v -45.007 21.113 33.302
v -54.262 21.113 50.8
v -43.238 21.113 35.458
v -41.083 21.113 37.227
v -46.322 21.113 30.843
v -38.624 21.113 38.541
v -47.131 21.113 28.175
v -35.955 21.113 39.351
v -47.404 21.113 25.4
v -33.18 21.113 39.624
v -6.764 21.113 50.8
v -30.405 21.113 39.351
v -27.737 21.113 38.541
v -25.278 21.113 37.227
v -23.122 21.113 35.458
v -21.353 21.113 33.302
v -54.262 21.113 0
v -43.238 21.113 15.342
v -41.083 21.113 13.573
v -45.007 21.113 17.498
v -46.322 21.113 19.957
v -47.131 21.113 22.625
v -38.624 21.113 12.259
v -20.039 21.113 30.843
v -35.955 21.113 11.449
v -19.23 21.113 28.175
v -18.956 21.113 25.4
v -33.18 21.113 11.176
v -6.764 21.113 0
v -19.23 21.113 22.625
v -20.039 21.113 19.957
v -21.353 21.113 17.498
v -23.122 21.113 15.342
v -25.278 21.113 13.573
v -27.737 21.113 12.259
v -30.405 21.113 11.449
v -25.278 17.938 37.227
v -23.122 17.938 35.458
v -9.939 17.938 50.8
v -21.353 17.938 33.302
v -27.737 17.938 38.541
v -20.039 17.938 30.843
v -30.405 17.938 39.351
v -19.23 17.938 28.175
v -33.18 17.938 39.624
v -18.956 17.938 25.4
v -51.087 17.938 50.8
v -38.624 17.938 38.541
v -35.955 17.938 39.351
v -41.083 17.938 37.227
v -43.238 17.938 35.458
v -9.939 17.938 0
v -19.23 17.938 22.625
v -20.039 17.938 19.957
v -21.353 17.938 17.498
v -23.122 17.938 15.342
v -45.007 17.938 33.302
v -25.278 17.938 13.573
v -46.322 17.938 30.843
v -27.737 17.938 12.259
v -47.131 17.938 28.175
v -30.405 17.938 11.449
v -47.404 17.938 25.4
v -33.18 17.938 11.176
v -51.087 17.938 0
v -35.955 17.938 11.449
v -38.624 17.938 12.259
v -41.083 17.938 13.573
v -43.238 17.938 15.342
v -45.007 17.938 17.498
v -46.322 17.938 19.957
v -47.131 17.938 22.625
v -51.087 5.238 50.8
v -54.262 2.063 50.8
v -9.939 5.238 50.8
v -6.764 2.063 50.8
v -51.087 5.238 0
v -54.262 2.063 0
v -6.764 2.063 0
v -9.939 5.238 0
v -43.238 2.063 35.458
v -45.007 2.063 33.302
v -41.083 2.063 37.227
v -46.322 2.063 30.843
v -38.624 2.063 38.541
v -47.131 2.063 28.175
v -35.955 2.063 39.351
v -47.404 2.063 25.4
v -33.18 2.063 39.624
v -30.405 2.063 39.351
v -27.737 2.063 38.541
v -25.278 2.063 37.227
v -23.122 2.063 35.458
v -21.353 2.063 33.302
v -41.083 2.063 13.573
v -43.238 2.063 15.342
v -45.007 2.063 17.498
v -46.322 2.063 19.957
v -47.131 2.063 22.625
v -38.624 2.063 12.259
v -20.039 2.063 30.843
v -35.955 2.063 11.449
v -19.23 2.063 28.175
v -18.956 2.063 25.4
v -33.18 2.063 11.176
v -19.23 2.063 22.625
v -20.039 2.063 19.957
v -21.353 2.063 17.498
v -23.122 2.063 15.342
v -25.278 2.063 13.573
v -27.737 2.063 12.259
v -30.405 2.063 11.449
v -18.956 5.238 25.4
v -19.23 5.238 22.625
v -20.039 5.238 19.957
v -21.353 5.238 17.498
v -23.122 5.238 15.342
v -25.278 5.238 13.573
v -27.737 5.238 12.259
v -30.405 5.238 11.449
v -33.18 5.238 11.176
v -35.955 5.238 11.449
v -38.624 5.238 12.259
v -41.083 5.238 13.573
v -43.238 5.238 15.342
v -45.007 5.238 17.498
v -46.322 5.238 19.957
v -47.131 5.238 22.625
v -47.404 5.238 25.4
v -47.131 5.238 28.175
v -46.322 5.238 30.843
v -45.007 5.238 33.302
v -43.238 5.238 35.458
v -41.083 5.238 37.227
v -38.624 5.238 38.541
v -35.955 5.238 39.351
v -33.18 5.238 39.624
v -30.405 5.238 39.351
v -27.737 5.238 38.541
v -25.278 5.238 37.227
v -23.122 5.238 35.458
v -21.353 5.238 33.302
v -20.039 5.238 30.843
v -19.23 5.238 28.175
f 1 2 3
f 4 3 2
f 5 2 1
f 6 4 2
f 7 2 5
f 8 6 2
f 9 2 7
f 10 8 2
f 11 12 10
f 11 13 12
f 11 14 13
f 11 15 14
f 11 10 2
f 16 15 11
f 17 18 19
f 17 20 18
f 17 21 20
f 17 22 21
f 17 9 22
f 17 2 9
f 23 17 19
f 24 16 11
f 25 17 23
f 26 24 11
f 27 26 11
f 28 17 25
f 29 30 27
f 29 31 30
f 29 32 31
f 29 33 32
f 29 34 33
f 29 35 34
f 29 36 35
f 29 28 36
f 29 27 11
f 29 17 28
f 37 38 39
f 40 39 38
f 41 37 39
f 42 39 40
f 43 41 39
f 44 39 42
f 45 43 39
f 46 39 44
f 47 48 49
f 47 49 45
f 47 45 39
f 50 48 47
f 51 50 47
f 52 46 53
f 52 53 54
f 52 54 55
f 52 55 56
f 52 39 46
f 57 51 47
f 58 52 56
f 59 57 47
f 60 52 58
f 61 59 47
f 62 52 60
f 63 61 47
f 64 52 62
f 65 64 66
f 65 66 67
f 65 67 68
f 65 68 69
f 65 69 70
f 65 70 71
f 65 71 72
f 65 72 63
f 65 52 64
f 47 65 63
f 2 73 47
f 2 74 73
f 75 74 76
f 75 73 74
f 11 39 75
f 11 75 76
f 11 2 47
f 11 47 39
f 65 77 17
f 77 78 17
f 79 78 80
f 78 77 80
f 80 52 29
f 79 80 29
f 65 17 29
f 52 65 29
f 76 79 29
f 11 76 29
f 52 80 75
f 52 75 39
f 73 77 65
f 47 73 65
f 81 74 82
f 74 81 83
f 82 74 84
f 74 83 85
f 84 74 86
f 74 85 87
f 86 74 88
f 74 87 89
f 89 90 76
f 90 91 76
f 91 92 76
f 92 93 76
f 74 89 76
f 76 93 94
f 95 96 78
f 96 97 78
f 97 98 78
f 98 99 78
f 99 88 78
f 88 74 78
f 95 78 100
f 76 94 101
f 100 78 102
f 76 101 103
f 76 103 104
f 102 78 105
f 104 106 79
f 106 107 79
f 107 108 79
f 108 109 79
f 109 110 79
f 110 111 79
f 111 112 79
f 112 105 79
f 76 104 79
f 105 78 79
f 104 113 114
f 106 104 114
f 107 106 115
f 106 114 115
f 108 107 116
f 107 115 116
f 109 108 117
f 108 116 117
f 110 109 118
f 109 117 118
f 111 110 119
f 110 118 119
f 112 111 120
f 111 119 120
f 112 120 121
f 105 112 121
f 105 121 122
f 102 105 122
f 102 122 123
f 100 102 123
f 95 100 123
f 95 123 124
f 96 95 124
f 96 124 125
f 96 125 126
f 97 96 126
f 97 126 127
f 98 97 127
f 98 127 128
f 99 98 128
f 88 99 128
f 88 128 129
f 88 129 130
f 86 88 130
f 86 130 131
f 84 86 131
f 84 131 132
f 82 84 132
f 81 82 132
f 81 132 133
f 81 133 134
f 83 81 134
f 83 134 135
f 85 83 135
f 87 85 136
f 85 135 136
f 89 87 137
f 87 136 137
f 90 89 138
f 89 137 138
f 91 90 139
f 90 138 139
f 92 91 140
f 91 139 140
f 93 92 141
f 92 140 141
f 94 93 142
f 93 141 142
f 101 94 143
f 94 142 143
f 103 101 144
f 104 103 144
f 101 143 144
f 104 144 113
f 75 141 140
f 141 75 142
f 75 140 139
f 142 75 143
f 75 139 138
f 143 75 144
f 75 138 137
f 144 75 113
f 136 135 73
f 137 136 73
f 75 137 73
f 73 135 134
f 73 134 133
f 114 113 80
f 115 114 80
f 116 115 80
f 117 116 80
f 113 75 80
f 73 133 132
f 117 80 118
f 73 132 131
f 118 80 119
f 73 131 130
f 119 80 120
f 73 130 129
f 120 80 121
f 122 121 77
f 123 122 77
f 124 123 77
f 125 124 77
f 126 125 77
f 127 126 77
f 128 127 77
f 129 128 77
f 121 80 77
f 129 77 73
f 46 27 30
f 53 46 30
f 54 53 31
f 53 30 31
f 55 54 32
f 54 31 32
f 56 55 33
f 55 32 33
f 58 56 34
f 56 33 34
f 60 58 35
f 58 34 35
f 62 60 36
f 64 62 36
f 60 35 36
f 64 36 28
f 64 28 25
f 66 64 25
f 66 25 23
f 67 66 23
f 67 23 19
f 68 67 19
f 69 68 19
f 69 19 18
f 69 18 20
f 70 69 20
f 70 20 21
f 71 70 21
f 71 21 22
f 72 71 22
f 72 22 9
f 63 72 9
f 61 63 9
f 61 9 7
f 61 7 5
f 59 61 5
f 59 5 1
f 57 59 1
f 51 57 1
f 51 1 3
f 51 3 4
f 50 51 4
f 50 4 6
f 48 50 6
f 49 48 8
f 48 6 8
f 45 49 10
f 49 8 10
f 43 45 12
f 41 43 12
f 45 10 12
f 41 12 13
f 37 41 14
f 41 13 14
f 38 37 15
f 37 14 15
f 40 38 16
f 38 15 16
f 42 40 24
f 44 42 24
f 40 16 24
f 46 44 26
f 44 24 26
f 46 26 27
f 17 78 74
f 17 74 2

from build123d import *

# Parameters (mm, degrees)
SKETCH1_W           = 47.498
SKETCH1_H           = 19.05
BOSS_EXTRUDE1_DEPTH = 50.8
SKETCH2_W           = 41.148
SKETCH2_H           = 12.7
CUT_EXTRUDE1_DEPTH  = 51.8
SKETCH5_R           = 14.224
CUT_EXTRUDE2_DEPTH  = 20.05


with BuildPart() as part:
    # Sketch1 → Boss-Extrude1 (new body)
    with BuildSketch(Plane.XY):
        with Locations((-30.51329874, 11.587546426)):
            Rectangle(SKETCH1_W, SKETCH1_H)
    extrude(amount=BOSS_EXTRUDE1_DEPTH)

    # Sketch2 → Cut-Extrude1 (cut, through all)
    with BuildSketch(Plane(origin=(0, 0, 0), x_dir=(-1, 0, 0), z_dir=(0, 0, -1))):
        with Locations((30.51329874, 11.587546426)):
            Rectangle(SKETCH2_W, SKETCH2_H)
    extrude(amount=-CUT_EXTRUDE1_DEPTH, mode=Mode.SUBTRACT)

    # Sketch5 → Cut-Extrude2 (cut, through all)
    with BuildSketch(Plane(origin=(0, 21.112546426, 0), x_dir=(1, 0, 0), z_dir=(0, 1, 0))):
        with Locations((-33.18029874, -25.4)):
            Circle(SKETCH5_R)
    extrude(amount=-CUT_EXTRUDE2_DEPTH, mode=Mode.SUBTRACT)


solid = part.part
